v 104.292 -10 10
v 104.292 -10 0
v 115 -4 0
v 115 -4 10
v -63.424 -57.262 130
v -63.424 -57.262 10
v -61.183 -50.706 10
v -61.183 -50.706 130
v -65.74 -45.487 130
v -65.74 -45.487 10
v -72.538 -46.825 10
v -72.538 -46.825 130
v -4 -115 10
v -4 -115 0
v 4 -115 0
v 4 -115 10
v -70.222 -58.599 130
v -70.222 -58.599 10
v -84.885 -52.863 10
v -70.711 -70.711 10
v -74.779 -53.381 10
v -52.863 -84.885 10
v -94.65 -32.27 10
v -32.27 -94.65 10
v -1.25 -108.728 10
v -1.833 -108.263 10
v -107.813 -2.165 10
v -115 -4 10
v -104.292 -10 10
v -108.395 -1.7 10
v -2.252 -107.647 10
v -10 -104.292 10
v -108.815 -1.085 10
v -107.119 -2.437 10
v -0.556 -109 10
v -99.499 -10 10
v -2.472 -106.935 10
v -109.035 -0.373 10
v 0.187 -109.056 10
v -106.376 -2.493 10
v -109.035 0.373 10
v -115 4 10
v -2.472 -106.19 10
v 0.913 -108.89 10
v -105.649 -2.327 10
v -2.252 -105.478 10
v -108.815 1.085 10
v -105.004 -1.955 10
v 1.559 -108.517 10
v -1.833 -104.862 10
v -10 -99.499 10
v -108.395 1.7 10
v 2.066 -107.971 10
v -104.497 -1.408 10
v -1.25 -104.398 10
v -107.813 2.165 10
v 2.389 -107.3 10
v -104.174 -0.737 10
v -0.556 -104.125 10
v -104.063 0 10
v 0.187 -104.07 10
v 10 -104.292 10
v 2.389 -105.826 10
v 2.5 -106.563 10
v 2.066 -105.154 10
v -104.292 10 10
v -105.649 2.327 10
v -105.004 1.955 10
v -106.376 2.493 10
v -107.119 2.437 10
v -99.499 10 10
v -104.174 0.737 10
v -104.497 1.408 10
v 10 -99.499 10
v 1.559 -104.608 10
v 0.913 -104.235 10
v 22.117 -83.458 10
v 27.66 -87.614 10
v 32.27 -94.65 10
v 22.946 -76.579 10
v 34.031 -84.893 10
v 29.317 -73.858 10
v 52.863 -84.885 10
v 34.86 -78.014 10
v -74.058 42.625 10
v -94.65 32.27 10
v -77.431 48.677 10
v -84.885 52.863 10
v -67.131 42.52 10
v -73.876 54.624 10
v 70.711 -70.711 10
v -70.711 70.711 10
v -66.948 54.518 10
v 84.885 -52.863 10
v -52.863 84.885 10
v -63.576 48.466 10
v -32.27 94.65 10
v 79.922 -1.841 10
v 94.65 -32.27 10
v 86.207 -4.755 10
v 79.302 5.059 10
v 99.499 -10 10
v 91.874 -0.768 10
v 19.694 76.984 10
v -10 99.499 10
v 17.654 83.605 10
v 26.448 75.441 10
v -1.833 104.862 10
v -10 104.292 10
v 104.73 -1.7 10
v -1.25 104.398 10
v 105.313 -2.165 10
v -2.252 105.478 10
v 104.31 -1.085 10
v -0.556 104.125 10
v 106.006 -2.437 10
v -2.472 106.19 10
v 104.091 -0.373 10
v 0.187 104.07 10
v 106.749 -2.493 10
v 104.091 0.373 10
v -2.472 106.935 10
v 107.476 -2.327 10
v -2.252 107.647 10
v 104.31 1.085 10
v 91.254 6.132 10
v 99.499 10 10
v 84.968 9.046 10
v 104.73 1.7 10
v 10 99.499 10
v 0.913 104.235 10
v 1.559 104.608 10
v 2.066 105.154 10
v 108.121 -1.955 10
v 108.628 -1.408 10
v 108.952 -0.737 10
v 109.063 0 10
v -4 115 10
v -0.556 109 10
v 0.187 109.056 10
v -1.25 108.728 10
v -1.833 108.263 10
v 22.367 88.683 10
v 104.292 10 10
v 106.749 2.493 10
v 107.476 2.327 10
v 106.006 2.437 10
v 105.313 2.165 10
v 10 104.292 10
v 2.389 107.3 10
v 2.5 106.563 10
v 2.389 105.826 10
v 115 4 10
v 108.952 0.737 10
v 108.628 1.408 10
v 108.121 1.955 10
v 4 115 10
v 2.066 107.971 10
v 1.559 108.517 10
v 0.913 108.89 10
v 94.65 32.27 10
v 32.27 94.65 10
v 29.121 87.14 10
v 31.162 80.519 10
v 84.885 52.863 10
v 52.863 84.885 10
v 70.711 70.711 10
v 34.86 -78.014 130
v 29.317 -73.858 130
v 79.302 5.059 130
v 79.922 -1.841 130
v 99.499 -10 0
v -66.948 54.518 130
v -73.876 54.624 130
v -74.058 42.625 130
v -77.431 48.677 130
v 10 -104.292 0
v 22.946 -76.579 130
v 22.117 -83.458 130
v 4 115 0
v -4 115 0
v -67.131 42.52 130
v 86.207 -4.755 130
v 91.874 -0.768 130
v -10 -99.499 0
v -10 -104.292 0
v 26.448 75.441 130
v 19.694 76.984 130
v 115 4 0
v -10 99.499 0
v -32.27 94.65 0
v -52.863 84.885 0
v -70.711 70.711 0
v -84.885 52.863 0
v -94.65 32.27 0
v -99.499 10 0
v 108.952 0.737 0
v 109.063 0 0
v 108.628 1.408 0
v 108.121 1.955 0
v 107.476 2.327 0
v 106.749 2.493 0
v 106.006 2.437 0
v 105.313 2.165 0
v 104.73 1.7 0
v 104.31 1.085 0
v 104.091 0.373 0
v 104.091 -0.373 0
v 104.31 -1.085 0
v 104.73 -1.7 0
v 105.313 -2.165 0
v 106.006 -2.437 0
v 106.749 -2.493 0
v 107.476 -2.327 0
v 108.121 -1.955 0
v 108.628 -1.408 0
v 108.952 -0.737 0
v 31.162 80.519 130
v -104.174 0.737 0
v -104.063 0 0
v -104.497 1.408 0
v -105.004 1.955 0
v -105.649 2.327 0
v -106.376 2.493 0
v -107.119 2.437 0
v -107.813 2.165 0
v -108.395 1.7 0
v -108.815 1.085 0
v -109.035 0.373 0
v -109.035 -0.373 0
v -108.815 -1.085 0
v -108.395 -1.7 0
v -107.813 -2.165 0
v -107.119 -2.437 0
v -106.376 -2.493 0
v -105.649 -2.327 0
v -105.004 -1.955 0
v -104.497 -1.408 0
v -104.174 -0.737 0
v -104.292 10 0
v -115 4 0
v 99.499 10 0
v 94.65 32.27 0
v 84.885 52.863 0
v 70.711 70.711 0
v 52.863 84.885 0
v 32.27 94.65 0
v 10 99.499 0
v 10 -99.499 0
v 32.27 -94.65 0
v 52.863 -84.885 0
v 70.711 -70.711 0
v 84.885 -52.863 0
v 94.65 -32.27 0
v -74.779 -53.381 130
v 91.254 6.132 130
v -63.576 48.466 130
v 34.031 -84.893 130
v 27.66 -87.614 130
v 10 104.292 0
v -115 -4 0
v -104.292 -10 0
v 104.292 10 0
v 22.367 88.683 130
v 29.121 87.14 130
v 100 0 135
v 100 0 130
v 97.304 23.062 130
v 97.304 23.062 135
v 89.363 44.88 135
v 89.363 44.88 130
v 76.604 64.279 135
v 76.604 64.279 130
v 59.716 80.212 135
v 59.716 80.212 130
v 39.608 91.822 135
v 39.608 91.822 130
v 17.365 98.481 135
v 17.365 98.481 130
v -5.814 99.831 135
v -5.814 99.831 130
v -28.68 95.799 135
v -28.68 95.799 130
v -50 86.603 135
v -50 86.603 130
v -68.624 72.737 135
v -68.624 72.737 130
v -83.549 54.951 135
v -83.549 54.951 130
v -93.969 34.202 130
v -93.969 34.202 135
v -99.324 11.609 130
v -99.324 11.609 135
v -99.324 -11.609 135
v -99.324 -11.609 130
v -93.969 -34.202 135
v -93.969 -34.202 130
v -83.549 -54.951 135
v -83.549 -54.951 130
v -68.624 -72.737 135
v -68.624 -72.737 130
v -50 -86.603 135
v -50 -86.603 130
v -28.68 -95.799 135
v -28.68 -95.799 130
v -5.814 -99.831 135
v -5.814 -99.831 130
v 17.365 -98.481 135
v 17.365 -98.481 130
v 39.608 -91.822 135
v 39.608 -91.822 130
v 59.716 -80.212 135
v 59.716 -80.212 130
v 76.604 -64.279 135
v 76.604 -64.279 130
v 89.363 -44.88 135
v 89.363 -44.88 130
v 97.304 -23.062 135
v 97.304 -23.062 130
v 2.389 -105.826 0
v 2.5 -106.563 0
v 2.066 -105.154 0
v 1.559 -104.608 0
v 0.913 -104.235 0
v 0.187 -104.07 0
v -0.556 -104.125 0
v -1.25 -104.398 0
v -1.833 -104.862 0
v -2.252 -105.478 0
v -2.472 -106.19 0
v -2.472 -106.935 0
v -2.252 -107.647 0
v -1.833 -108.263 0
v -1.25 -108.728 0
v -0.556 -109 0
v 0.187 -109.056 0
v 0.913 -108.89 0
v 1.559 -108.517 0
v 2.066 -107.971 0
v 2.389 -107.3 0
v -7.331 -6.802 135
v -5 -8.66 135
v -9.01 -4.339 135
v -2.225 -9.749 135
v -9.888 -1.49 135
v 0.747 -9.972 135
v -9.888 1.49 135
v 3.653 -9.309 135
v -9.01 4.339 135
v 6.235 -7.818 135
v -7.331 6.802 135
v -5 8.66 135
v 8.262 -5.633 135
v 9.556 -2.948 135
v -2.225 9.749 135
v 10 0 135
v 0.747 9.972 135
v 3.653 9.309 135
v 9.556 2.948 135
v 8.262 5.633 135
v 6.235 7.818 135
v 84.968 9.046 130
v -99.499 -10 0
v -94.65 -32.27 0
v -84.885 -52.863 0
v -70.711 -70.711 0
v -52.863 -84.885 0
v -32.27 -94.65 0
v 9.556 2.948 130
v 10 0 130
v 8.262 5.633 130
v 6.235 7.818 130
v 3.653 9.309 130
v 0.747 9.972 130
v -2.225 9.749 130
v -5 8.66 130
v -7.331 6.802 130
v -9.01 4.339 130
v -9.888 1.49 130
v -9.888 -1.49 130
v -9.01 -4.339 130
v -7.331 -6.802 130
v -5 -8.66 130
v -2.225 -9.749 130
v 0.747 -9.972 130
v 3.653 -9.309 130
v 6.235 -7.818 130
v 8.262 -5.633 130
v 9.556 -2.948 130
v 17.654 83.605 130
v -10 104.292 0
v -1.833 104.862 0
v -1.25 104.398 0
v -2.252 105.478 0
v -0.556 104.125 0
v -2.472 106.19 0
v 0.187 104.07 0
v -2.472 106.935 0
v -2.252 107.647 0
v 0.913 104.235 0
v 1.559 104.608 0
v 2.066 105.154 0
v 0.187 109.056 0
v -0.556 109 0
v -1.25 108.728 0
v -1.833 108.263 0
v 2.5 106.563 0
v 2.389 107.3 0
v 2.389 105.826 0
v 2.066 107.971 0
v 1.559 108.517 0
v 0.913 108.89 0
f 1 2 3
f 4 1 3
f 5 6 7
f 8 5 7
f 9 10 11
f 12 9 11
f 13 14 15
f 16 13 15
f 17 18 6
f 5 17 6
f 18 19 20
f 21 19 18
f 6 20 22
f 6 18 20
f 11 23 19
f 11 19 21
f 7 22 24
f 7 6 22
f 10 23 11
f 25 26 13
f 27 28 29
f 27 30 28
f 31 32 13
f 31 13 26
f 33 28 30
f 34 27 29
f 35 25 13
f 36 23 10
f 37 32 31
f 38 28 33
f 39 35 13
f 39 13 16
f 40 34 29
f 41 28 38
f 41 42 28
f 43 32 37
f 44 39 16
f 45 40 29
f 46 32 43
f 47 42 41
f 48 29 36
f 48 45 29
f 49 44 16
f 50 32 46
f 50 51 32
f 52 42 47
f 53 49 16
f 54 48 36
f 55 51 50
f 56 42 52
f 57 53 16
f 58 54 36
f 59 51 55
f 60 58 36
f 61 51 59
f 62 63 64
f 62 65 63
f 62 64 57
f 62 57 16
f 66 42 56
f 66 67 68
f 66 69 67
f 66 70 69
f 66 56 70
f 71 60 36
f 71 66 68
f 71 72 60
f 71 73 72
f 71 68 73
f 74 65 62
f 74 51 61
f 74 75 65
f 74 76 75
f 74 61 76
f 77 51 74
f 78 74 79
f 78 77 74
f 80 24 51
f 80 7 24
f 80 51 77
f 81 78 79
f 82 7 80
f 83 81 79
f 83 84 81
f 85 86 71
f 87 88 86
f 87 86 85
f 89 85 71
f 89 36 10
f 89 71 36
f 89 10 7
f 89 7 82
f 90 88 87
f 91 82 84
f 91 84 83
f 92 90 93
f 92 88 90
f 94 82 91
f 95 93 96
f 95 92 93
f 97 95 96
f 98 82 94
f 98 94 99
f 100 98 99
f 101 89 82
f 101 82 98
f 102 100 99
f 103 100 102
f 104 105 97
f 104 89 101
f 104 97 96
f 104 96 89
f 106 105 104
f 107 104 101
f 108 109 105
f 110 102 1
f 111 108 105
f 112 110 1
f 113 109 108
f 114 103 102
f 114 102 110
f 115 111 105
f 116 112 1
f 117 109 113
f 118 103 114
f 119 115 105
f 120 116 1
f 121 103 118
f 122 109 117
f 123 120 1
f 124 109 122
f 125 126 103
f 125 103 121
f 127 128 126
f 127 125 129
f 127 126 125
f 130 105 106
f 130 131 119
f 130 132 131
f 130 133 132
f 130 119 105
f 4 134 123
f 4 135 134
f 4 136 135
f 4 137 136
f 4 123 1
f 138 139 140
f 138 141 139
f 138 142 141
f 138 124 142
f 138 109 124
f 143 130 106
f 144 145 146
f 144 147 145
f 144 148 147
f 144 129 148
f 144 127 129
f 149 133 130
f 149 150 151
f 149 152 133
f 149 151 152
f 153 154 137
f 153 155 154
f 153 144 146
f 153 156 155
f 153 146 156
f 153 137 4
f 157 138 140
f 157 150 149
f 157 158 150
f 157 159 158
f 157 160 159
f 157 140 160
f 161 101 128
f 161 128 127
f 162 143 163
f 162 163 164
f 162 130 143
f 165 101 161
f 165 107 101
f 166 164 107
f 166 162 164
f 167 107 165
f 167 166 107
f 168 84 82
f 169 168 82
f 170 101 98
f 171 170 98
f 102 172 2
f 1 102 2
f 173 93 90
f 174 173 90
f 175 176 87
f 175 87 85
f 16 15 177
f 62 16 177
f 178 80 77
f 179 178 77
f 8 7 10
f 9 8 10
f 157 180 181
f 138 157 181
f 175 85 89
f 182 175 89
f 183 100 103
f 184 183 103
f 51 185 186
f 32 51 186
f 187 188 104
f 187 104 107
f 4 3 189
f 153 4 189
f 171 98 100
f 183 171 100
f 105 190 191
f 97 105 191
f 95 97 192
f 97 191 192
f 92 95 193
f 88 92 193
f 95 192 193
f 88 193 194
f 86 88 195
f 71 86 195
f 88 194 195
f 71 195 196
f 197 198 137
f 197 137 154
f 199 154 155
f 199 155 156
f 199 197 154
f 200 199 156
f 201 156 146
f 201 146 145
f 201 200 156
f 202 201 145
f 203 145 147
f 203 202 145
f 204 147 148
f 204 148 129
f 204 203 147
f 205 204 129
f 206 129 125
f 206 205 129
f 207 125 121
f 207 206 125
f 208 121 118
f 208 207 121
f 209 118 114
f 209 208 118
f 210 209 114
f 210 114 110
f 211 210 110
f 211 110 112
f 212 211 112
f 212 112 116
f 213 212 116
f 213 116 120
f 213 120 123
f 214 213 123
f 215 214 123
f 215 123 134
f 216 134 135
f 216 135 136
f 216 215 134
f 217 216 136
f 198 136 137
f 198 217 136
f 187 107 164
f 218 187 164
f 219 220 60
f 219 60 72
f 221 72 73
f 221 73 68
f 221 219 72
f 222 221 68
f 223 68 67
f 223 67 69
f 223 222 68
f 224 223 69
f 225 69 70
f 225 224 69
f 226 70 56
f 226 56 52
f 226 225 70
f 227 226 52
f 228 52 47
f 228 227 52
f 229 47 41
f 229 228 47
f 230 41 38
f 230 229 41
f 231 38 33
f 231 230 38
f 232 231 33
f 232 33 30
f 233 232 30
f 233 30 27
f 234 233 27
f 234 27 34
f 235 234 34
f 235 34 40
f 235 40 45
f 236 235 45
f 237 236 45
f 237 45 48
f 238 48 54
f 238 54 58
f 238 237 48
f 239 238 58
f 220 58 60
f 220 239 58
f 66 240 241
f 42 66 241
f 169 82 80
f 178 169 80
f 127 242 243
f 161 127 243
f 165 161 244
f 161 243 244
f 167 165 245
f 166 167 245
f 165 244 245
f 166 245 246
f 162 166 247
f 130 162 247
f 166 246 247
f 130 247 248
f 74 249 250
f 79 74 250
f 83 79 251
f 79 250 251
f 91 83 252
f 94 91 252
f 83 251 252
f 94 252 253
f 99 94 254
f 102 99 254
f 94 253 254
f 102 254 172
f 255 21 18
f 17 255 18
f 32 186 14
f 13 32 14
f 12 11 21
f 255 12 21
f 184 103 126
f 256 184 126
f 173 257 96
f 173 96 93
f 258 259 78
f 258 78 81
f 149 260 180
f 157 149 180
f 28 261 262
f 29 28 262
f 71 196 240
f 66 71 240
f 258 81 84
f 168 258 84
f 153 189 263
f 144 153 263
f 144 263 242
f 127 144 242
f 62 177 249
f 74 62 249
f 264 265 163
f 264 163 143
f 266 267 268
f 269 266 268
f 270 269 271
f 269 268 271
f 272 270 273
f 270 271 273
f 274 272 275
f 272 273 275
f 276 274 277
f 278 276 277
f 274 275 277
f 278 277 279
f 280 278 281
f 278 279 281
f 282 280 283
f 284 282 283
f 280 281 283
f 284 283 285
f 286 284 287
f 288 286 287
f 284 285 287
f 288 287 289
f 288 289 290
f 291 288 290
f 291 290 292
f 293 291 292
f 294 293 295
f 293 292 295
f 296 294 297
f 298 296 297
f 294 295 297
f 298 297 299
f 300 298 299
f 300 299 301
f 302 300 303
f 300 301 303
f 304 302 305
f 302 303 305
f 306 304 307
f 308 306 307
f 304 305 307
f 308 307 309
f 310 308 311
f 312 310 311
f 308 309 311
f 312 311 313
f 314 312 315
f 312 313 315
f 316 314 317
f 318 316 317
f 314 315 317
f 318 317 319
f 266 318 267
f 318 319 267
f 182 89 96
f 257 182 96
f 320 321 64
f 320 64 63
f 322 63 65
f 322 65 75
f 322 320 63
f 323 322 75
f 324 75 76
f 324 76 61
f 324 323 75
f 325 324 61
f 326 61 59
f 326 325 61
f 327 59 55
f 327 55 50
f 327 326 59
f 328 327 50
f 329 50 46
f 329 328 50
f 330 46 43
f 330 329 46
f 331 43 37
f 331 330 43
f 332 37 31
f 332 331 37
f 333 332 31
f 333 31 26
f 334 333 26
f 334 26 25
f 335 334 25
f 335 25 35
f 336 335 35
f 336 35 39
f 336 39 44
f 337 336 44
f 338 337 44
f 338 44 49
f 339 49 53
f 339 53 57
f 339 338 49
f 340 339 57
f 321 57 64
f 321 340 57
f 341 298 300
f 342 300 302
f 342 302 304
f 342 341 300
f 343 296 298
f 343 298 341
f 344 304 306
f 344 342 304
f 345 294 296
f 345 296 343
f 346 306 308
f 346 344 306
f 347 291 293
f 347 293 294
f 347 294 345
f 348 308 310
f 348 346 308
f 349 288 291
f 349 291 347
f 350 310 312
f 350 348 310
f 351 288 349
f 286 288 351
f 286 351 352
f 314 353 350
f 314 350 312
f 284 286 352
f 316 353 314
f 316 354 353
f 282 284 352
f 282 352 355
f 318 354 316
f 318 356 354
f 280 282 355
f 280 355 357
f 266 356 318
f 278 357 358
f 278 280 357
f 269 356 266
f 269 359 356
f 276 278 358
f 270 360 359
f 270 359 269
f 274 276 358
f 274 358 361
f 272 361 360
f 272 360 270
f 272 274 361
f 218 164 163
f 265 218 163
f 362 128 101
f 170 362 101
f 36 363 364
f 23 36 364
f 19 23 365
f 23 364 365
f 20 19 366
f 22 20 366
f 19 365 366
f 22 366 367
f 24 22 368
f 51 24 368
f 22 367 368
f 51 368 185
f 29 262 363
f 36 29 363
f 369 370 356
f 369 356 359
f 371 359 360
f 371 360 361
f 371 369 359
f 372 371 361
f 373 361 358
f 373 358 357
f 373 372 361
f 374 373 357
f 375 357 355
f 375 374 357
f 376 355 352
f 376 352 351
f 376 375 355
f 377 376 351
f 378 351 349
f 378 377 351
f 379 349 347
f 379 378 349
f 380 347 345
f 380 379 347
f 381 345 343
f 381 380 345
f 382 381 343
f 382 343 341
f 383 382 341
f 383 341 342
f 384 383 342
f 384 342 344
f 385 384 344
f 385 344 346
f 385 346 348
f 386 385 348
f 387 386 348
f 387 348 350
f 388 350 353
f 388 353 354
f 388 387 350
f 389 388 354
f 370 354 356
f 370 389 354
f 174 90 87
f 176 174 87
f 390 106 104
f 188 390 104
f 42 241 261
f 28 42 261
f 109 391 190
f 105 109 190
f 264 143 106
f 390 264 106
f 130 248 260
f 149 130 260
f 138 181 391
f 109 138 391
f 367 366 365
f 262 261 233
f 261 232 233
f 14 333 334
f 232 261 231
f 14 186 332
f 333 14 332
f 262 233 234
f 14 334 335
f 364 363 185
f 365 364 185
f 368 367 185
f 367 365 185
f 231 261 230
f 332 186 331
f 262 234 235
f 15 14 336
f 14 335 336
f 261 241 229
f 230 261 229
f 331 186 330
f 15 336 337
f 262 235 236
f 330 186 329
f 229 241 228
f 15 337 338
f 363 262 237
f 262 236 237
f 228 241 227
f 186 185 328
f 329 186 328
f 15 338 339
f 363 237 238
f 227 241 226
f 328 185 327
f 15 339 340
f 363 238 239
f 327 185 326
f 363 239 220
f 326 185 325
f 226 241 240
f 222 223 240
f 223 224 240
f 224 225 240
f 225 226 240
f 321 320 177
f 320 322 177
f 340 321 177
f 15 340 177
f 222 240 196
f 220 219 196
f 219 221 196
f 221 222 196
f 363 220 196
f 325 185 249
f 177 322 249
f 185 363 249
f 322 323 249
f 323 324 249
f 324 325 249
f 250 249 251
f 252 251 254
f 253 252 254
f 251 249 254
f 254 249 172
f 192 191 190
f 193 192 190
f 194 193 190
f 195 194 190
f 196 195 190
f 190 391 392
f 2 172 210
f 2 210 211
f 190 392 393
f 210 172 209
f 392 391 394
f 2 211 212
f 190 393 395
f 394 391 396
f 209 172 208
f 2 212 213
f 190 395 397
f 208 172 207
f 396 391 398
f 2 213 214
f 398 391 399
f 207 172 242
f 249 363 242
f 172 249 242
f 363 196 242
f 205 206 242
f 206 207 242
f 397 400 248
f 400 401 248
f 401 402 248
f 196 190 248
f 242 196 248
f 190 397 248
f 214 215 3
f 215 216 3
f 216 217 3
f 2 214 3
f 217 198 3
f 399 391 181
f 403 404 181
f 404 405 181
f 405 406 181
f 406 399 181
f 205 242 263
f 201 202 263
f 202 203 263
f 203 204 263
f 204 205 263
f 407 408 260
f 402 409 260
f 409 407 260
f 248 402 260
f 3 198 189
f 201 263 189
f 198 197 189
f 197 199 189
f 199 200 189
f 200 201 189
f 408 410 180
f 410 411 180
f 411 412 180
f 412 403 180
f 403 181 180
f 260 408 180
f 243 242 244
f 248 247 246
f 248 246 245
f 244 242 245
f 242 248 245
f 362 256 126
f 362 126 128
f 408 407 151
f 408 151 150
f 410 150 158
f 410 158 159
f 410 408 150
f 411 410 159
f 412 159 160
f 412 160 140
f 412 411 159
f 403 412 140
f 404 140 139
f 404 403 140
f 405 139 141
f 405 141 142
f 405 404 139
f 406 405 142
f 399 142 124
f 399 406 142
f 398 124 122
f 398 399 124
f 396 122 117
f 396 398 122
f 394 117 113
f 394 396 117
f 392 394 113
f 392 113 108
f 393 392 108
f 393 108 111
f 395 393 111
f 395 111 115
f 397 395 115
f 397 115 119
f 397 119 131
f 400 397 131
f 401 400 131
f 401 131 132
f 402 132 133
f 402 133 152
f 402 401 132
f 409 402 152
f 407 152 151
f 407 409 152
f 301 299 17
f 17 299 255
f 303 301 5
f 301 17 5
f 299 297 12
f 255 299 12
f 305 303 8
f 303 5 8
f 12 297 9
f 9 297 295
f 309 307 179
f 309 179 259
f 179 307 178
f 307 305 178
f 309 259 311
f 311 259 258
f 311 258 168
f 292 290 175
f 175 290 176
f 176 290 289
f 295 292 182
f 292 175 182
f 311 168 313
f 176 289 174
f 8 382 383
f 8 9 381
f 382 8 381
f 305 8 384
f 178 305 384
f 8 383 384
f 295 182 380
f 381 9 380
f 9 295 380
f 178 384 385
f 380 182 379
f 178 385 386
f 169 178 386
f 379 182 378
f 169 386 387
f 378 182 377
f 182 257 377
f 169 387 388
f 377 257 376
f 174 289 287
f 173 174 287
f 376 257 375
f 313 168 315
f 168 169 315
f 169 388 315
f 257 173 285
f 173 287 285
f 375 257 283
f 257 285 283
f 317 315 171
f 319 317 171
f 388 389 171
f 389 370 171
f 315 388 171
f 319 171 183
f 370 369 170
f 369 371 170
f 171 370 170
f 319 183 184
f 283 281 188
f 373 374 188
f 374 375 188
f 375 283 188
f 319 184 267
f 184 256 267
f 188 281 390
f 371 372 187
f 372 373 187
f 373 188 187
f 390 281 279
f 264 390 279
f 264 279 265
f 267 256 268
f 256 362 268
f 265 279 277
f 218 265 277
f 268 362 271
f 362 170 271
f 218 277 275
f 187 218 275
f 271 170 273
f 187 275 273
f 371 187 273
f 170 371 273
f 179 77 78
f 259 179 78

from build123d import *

# Parameters (mm, degrees)
SKETCH1_R           = 2.5
BOSS_EXTRUDE1_DEPTH = 10
BOSS_EXTRUDE2_DEPTH = 120
SKETCH3_R           = 100
SKETCH3_R_2         = 10
BOSS_EXTRUDE3_DEPTH = 5


with BuildPart() as part:
    # Sketch1 → Boss-Extrude1 (new body)
    with BuildSketch(Plane.XY):
        with BuildLine():
            Line((10, 99.498743711), (10, 104.292304576))
            Line((10, 104.292304576), (4, 115))
            Line((4, 115), (-4, 115))
            Line((-4, 115), (-10, 104.292304576))
            Line((-10, 104.292304576), (-10, 99.498743711))
            ThreePointArc((-10, 99.498743711), (-70.710678119, 70.710678119), (-99.498743711, 10))
            Line((-99.498743711, 10), (-104.292304576, 10))
            Line((-104.292304576, 10), (-115, 4))
            Line((-115, 4), (-115, -4))
            Line((-115, -4), (-104.292304576, -10))
            Line((-104.292304576, -10), (-99.498743711, -10))
            ThreePointArc((-99.498743711, -10), (-70.710678119, -70.710678119), (-10, -99.498743711))
            Line((-10, -99.498743711), (-10, -104.292304576))
            Line((-10, -104.292304576), (-4, -115))
            Line((-4, -115), (4, -115))
            Line((4, -115), (10, -104.292304576))
            Line((10, -104.292304576), (10, -99.498743711))
            ThreePointArc((10, -99.498743711), (70.710678119, -70.710678119), (99.498743711, -10))
            Line((99.498743711, -10), (104.292304576, -10))
            Line((104.292304576, -10), (115, -4))
            Line((115, -4), (115, 4))
            Line((115, 4), (104.292304576, 10))
            Line((104.292304576, 10), (99.498743711, 10))
            ThreePointArc((99.498743711, 10), (70.710678119, 70.710678119), (10, 99.498743711))
        make_face()
        with Locations((-106.562672681, 0)):
            Circle(SKETCH1_R, mode=Mode.SUBTRACT)
        with Locations((106.562672681, 0)):
            Circle(SKETCH1_R, mode=Mode.SUBTRACT)
        with Locations((0, 106.562672681)):
            Circle(SKETCH1_R, mode=Mode.SUBTRACT)
        with Locations((0, -106.562672681)):
            Circle(SKETCH1_R, mode=Mode.SUBTRACT)
    extrude(amount=BOSS_EXTRUDE1_DEPTH)

    # Sketch2 → Boss-Extrude2 (add)
    with BuildSketch(Plane.XY.offset(10)):
        Polygon((-61.183161588, -50.705696973), (-65.740333213, -45.487250194), (-72.538226504, -46.824653202), (-74.77894817, -53.380502987), (-70.221776545, -58.598949766), (-63.423883254, -57.261546759), align=None)
        Polygon((34.031190696, -84.892949499), (34.859909403, -78.01448853), (29.317346819, -73.857566592), (22.946065527, -76.579105623), (22.117346819, -83.457566592), (27.659909403, -87.61448853), align=None)
        Polygon((-67.13062022, 42.519722439), (-63.575825884, 48.466438948), (-66.948436282, 54.518339402), (-73.875841015, 54.623523347), (-77.430635351, 48.676806839), (-74.058024953, 42.624906385), align=None)
        Polygon((19.694156606, 76.984330633), (26.448311953, 75.441156778), (31.161817388, 80.518839962), (29.121167475, 87.139697001), (22.367012128, 88.682870856), (17.653506693, 83.605187672), align=None)
        Polygon((79.302278382, 5.059210493), (79.921781616, -1.841239909), (86.207498579, -4.75495957), (91.873712307, -0.768228831), (91.254209072, 6.13222157), (84.96849211, 9.045941232), align=None)
    extrude(amount=BOSS_EXTRUDE2_DEPTH)

    # Sketch3 → Boss-Extrude3 (add)
    with BuildSketch(Plane.XY.offset(130)):
        Circle(SKETCH3_R)
        Circle(SKETCH3_R_2, mode=Mode.SUBTRACT)
    extrude(amount=BOSS_EXTRUDE3_DEPTH)


solid = part.part
